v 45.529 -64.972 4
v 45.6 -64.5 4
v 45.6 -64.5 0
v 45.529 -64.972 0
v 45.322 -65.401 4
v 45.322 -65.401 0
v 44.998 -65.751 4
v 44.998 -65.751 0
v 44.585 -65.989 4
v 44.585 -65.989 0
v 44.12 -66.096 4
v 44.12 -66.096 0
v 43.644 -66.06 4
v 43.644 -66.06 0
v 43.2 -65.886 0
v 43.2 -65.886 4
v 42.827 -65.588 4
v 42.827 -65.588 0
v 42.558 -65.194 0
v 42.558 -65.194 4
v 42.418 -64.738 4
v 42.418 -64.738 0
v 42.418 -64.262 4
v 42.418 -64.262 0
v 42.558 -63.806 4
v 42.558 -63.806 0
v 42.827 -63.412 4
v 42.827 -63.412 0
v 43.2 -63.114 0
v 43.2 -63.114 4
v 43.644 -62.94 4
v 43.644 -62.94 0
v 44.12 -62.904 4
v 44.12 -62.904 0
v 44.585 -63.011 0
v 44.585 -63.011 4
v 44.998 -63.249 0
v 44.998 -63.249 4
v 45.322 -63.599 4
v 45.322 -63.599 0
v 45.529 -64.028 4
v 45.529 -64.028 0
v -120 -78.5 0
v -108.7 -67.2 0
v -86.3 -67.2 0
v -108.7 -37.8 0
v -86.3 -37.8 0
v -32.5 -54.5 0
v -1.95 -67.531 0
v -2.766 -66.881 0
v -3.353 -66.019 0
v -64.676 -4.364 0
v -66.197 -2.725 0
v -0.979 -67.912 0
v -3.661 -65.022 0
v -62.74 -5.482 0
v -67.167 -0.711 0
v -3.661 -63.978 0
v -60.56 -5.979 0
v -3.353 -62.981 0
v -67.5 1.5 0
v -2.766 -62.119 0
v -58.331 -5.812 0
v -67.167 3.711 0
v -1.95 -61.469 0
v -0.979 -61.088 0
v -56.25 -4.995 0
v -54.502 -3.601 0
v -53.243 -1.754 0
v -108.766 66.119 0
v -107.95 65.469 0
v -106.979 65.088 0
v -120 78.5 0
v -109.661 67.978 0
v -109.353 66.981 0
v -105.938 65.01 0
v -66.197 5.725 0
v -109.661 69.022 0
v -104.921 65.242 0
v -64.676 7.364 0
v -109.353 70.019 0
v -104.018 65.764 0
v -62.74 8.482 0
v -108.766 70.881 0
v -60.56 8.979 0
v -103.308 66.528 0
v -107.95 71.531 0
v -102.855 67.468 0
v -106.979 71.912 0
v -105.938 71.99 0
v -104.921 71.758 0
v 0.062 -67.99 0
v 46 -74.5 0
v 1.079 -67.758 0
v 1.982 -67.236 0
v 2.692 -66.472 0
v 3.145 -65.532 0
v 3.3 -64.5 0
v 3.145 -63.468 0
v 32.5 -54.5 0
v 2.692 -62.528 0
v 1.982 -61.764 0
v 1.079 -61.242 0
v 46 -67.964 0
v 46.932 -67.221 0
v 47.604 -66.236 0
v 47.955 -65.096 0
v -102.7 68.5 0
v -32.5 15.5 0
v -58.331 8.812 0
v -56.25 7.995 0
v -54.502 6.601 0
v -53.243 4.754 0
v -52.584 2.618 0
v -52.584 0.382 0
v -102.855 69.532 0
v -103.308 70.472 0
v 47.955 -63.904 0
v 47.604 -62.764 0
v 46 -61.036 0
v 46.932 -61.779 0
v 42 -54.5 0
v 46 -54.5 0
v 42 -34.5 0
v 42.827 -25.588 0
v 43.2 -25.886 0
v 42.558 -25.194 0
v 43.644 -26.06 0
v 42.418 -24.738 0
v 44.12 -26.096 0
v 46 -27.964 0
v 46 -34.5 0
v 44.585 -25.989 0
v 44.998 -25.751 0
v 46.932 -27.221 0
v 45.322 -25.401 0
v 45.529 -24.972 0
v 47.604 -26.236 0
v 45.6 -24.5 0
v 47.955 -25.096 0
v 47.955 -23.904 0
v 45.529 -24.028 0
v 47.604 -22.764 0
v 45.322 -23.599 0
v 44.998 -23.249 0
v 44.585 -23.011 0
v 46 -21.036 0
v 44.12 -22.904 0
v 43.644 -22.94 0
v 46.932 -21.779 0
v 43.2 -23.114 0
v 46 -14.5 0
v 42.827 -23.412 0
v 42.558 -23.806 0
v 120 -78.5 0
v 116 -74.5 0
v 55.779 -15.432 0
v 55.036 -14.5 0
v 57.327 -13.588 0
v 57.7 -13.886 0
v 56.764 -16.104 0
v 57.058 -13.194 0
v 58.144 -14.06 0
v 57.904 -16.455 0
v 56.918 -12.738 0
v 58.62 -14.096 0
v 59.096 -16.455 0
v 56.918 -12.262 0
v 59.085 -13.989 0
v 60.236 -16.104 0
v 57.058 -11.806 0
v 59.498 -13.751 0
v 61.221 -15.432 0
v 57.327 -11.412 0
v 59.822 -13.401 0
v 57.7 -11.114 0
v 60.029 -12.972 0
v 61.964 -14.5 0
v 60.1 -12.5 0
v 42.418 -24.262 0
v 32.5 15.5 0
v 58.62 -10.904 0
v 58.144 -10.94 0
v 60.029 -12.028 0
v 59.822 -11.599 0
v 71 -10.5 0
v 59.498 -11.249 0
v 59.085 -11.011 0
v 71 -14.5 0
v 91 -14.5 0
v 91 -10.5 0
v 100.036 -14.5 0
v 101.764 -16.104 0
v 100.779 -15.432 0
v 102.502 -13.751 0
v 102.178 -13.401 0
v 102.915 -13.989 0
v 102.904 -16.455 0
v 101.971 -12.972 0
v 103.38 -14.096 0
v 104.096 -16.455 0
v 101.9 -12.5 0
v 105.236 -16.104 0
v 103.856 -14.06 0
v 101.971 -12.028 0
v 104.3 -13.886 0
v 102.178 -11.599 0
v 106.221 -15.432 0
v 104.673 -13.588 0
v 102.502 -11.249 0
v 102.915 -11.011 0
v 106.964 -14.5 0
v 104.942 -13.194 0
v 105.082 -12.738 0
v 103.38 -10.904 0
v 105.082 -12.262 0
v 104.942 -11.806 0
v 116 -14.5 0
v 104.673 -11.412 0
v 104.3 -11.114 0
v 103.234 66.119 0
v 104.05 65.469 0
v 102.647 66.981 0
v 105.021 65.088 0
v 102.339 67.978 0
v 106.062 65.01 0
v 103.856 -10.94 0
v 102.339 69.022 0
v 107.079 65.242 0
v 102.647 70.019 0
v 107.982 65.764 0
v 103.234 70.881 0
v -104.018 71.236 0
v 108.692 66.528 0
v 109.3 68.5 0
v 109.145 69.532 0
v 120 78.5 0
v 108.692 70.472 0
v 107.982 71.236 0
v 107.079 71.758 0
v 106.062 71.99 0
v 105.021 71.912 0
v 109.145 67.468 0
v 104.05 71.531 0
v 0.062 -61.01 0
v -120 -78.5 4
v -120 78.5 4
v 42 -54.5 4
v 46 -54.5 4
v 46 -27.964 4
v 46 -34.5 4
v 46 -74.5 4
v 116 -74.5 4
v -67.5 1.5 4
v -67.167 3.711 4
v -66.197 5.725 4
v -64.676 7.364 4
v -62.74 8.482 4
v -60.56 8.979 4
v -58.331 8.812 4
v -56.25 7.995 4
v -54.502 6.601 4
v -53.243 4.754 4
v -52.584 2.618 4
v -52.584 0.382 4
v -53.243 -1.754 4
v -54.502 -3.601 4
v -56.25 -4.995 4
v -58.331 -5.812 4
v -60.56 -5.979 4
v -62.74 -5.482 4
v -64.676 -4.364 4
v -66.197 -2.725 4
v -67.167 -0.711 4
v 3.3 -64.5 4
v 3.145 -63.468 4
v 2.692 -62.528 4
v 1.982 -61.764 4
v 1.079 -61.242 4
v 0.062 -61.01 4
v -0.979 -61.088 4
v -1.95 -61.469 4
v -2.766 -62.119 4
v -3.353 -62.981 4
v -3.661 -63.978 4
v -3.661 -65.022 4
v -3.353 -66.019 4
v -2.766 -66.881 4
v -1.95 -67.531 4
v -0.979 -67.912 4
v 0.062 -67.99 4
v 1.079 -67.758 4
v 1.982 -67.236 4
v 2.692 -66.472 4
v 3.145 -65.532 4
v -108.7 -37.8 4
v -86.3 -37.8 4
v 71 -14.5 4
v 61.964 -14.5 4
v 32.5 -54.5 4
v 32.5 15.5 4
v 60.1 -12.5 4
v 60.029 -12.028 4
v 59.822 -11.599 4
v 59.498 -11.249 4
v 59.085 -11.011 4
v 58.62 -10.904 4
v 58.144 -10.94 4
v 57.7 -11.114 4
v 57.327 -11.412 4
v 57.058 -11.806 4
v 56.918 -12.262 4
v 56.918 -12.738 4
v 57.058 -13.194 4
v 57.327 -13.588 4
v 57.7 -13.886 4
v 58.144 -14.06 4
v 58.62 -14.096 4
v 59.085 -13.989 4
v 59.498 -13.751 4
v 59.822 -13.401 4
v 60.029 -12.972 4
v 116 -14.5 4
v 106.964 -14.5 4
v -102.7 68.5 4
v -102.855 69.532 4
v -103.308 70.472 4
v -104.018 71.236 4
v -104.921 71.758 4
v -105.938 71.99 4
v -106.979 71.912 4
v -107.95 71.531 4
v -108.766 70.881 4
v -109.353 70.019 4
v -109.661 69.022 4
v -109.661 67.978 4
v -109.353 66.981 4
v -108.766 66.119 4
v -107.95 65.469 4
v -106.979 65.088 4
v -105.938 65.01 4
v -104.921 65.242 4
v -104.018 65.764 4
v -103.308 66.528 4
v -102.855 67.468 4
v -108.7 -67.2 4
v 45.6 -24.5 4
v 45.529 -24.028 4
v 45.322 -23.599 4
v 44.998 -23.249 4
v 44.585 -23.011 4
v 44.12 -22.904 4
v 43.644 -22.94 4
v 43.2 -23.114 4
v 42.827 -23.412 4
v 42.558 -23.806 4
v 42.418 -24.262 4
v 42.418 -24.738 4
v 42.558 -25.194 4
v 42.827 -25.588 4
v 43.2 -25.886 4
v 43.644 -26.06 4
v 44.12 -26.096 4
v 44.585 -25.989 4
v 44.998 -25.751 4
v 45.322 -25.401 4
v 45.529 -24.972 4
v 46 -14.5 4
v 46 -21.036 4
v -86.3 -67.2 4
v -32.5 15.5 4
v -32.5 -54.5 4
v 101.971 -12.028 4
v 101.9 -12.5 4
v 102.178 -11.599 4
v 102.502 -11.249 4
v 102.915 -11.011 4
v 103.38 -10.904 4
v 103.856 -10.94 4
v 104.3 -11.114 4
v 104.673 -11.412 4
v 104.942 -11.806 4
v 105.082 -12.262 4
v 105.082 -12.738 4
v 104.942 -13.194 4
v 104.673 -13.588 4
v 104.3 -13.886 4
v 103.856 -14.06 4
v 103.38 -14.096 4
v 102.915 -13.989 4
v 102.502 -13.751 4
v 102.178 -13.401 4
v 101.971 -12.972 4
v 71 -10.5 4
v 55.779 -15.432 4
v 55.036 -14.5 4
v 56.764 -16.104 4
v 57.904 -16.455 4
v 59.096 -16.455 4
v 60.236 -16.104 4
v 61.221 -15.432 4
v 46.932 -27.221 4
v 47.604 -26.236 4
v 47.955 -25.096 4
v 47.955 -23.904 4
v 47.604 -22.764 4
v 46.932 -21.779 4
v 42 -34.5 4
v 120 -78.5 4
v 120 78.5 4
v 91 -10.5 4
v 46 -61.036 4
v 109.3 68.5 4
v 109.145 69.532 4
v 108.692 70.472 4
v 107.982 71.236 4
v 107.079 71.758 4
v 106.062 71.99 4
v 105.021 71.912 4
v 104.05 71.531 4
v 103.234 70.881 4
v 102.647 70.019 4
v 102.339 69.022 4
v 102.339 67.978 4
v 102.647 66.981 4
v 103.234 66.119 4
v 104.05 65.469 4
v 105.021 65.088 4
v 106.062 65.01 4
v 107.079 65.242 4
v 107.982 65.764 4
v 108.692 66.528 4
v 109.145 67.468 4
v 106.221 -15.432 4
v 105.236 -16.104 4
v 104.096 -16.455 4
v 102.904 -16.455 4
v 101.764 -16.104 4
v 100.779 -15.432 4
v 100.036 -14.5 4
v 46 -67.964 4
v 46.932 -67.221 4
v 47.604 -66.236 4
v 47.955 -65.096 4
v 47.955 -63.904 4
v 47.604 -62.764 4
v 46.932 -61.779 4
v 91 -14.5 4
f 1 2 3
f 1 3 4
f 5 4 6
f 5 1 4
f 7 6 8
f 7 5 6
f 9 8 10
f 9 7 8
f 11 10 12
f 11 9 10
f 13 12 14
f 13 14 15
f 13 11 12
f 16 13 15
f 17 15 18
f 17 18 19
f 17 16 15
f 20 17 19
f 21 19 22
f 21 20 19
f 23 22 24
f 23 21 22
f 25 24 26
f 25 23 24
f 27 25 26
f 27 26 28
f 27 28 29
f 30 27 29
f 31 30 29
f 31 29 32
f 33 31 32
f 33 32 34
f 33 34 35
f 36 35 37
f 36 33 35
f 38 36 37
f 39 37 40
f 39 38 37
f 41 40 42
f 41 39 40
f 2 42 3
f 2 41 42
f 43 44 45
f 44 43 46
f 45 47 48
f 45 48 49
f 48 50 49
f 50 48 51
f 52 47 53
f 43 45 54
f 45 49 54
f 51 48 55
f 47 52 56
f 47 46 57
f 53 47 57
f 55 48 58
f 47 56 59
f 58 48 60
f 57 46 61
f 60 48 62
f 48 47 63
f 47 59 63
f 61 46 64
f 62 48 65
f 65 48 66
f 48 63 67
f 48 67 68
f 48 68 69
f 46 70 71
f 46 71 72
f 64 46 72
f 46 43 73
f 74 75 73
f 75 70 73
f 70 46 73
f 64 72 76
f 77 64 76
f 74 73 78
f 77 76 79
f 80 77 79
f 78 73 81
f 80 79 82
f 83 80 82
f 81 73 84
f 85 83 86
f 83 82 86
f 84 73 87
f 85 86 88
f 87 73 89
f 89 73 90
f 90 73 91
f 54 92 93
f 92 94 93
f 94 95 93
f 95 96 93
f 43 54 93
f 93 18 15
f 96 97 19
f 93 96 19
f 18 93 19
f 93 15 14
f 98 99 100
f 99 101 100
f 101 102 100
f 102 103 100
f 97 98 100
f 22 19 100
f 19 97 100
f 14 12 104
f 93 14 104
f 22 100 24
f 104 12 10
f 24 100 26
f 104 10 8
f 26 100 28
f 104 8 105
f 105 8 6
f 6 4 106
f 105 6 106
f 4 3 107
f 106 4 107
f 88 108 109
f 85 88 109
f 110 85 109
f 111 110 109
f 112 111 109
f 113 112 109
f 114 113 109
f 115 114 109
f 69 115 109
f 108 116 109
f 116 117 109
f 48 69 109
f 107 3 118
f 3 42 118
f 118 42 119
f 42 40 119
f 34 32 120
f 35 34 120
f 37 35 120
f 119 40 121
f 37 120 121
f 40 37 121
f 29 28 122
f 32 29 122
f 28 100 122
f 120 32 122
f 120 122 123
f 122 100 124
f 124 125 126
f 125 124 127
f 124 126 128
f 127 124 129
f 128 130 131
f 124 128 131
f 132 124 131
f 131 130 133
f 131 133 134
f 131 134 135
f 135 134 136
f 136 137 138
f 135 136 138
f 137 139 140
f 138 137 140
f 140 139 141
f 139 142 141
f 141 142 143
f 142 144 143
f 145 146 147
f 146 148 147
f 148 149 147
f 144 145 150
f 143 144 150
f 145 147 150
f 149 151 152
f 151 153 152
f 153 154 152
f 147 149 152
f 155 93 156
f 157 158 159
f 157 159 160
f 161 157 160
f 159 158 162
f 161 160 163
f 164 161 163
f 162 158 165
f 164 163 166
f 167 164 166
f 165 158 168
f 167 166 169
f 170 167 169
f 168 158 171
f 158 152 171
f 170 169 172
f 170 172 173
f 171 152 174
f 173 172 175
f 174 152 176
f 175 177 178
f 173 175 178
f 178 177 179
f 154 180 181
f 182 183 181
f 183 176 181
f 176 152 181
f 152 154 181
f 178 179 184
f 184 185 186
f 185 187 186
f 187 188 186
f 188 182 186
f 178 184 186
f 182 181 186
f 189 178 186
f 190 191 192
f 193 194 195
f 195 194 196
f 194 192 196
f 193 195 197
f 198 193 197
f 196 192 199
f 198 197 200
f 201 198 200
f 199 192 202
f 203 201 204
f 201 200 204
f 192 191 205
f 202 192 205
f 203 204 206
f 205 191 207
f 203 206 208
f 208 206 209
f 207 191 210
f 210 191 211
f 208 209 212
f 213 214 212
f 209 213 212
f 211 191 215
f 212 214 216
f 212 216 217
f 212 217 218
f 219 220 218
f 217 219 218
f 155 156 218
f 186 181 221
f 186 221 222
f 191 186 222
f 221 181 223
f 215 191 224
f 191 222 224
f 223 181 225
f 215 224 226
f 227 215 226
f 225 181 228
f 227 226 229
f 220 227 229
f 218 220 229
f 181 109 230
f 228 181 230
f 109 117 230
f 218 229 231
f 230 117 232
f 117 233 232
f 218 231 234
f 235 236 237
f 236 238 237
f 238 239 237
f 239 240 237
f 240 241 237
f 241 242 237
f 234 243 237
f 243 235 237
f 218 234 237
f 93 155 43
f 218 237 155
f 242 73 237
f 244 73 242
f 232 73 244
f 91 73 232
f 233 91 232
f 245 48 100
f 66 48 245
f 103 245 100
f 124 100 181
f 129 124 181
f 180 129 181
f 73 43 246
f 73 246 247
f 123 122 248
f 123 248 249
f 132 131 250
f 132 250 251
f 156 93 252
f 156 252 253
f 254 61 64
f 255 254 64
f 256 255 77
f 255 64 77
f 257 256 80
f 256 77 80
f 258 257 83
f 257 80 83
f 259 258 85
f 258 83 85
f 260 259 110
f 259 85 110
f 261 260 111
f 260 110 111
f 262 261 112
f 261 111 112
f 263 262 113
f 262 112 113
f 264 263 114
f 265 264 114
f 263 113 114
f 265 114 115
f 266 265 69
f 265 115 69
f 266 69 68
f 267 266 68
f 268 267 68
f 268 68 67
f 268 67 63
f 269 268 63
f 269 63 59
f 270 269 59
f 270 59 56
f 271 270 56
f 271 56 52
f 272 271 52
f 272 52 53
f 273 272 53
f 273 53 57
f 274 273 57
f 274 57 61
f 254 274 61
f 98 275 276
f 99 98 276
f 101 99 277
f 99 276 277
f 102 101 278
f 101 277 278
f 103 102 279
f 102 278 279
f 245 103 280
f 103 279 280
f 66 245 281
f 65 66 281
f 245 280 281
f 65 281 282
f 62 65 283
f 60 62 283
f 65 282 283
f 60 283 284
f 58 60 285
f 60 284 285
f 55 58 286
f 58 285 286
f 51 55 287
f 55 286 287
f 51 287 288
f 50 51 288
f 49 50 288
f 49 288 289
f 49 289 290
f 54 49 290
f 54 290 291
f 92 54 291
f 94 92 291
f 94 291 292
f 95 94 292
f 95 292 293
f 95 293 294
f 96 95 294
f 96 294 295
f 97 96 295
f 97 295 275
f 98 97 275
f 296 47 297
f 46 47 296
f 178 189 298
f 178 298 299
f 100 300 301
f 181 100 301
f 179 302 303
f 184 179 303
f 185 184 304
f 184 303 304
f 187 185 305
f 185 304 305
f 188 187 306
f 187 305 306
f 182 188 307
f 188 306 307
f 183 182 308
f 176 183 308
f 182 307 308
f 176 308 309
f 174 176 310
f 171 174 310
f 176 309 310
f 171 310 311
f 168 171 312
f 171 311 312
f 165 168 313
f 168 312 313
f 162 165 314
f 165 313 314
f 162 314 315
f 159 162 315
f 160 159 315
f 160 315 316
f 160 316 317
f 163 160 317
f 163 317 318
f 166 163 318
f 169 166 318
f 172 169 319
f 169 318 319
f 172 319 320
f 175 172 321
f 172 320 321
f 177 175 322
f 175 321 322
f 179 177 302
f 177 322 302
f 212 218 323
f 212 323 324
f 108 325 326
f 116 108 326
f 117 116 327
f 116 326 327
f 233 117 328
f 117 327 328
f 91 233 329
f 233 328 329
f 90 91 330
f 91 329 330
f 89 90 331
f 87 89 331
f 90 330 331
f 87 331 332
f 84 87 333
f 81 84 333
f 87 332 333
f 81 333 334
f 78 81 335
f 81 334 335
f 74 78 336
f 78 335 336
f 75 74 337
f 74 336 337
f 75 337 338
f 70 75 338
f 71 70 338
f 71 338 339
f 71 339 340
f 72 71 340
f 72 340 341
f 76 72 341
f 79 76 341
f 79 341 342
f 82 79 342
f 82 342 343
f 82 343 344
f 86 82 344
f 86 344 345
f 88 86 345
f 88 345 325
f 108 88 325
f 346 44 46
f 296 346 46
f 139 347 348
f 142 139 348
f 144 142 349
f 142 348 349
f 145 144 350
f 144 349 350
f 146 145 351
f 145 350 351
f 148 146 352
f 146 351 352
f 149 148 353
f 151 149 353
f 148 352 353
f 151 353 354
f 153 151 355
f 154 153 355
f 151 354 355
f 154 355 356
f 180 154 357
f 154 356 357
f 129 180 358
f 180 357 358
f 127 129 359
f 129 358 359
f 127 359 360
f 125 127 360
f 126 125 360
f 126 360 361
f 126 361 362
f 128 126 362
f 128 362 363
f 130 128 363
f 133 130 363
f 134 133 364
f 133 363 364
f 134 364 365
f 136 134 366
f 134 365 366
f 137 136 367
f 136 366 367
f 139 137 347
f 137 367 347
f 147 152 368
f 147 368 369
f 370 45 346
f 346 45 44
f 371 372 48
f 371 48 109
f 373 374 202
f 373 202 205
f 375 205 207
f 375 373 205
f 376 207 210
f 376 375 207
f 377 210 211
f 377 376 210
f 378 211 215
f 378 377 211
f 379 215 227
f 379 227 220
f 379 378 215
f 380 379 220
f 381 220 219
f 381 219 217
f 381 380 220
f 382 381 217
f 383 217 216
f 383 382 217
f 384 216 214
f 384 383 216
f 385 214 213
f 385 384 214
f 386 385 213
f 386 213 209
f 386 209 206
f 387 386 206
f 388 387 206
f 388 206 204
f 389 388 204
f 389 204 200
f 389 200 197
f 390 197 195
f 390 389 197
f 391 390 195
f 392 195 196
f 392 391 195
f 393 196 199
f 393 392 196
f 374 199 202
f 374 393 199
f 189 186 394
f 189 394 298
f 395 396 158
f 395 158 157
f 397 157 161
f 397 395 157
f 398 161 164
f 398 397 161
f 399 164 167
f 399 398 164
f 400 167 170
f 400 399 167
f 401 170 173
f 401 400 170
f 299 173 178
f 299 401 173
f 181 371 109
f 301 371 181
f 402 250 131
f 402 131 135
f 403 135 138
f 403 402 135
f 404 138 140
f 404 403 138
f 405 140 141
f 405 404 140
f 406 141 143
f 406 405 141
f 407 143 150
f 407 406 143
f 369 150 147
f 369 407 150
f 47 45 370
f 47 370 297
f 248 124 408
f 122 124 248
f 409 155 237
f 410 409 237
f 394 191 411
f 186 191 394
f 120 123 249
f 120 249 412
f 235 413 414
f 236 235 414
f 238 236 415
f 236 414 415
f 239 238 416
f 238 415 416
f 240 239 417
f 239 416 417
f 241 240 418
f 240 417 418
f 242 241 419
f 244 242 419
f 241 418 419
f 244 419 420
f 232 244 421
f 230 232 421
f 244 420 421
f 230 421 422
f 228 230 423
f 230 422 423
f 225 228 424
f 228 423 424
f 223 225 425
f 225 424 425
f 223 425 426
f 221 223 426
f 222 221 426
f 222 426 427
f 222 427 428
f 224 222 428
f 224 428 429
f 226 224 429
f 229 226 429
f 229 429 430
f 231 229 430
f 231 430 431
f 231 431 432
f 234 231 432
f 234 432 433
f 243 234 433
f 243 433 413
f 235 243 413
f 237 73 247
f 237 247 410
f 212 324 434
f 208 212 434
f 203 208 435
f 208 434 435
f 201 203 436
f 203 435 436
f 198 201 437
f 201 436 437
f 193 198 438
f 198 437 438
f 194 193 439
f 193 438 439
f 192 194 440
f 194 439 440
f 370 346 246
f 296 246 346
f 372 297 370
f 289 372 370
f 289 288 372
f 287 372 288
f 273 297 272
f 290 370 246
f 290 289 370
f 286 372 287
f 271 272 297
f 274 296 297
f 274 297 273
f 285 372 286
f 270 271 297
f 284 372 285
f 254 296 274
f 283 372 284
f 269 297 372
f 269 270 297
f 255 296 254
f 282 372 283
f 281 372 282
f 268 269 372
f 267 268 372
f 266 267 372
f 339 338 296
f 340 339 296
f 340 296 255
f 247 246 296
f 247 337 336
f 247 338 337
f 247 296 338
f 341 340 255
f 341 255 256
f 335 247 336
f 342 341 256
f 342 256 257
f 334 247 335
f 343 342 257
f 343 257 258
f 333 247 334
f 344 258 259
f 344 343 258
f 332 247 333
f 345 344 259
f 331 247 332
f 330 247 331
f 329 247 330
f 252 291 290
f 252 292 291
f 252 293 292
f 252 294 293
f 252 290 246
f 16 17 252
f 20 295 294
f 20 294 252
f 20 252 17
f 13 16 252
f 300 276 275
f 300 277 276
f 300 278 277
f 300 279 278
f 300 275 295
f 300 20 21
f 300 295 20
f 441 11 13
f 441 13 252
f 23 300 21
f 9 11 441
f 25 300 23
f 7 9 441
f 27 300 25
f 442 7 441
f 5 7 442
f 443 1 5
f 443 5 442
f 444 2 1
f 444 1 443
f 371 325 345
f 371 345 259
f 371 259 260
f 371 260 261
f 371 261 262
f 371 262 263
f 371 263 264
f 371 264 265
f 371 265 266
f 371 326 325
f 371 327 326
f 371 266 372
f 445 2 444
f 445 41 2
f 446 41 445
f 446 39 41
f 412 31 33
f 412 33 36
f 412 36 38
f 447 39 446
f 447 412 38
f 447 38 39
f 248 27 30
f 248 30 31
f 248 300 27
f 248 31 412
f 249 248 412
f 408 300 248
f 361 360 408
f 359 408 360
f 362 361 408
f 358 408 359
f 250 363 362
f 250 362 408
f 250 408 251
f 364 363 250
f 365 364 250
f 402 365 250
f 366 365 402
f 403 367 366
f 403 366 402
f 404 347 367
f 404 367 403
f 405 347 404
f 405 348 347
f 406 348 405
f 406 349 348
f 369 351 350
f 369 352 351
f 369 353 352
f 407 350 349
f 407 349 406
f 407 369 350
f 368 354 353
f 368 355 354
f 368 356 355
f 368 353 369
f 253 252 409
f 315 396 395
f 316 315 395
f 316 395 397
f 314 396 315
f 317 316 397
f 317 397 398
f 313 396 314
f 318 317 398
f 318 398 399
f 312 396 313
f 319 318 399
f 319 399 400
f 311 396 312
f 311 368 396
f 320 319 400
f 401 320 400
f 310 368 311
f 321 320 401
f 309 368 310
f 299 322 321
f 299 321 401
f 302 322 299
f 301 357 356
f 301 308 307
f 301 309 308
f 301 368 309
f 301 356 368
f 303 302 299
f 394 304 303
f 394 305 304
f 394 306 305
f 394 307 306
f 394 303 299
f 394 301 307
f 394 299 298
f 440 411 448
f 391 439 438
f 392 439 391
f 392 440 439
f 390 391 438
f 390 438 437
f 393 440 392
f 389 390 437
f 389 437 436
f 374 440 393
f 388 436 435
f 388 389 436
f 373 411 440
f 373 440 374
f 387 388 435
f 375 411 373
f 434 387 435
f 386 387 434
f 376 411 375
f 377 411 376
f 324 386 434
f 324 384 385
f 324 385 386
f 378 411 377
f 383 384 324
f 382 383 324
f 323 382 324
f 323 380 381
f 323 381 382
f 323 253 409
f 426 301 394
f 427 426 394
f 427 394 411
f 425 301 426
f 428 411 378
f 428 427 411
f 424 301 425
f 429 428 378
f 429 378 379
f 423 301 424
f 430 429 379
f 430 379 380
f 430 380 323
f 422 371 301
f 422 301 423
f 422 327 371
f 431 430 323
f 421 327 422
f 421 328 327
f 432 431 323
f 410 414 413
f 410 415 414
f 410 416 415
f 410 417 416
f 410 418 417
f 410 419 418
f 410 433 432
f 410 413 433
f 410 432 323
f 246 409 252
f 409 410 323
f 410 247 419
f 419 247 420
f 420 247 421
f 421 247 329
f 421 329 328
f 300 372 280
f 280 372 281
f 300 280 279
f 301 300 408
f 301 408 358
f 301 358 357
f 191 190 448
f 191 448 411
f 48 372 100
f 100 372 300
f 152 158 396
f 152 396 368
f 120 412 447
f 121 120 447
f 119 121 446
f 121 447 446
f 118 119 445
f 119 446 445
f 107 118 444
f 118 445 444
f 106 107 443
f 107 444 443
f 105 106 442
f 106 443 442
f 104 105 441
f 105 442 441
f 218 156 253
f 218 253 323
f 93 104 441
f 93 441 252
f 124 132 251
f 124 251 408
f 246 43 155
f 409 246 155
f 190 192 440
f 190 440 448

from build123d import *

# Parameters (mm, degrees)
SKETCH1_W           = 240
SKETCH1_H           = 157
BOSS_EXTRUDE1_DEPTH = 4
SKETCH2_R           = 3.5
CUT_EXTRUDE1_DEPTH  = 144.451211218
CUT_EXTRUDE2_DEPTH  = 4
SKETCH4_R           = 1.6
BOSS_EXTRUDE2_DEPTH = 4
SKETCH4_2_R         = 1.6
CUT_EXTRUDE3_DEPTH  = 4
SKETCH5_R           = 1.6
CUT_EXTRUDE5_DEPTH  = 4
BOSS_EXTRUDE4_DEPTH = 4
SKETCH6_R           = 7.5
CUT_EXTRUDE6_DEPTH  = 144.451211218
SKETCH7_W           = 65
SKETCH7_H           = 70
CUT_EXTRUDE7_DEPTH  = 144.451211218
SKETCH8_W           = 22.4
SKETCH8_H           = 29.4
CUT_EXTRUDE8_DEPTH  = 144.451211218


with BuildPart() as part:
    # Sketch1 → Boss-Extrude1 (new body)
    with BuildSketch(Plane.XY):
        Rectangle(SKETCH1_W, SKETCH1_H)
    extrude(amount=BOSS_EXTRUDE1_DEPTH)

    # Sketch2 → Cut-Extrude1 (cut, through all)
    with BuildSketch(Plane.XY.offset(4)):
        with Locations((-106.199999998, 68.5)):
            Circle(SKETCH2_R)
        with Locations((105.8, 68.5)):
            Circle(SKETCH2_R)
        with Locations((-0.199999998, -64.5)):
            Circle(SKETCH2_R)
    extrude(amount=-CUT_EXTRUDE1_DEPTH, mode=Mode.SUBTRACT)

    # Sketch3 → Cut-Extrude2 (cut)
    with BuildSketch(Plane(origin=(0, 0, 0), x_dir=(-1, 0, 0), z_dir=(0, 0, -1))):
        Polygon((-46, -74.5), (-116, -74.5), (-116, -14.5), (-91, -14.5), (-91, -10.5), (-71, -10.5), (-71, -14.5), (-46, -14.5), (-46, -34.5), (-42, -34.5), (-42, -54.5), (-46, -54.5), align=None)
    extrude(amount=-CUT_EXTRUDE2_DEPTH, mode=Mode.SUBTRACT)

    # Sketch4 → Boss-Extrude2 (add)
    with BuildSketch(Plane.XY.offset(4)):
        with Locations((44, -24.5)):
            Circle(SKETCH4_R)
        with BuildLine():
            Line((46, -21.035898385), (46, -27.964101615))
            ThreePointArc((46, -27.964101615), (48, -24.5), (46, -21.035898385))
        make_face()
    boss_extrude2 = extrude(amount=-BOSS_EXTRUDE2_DEPTH)

    # Sketch4<2> → Cut-Extrude3 (cut)
    with BuildSketch(Plane.XY.offset(4)):
        with Locations((44, -24.5)):
            Circle(SKETCH4_2_R)
    cut_extrude3 = extrude(amount=-CUT_EXTRUDE3_DEPTH, mode=Mode.SUBTRACT)

    # Mirror1: Boss-Extrude2, Cut-Extrude3 across plane
    add(boss_extrude2.mirror(Plane(origin=(0, -44.5, 0), x_dir=(0, 0, 1), z_dir=(0, -1, 0))))
    add(cut_extrude3.mirror(Plane(origin=(0, -44.5, 0), x_dir=(0, 0, 1), z_dir=(0, -1, 0))), mode=Mode.SUBTRACT)

    # Sketch5 → Cut-Extrude5 (cut)
    with BuildSketch(Plane.XY.offset(4)):
        with Locations((58.5, -12.5)):
            Circle(SKETCH5_R)
    cut_extrude5 = extrude(amount=-CUT_EXTRUDE5_DEPTH, mode=Mode.SUBTRACT)

    # Sketch5<5> → Boss-Extrude4 (add)
    with BuildSketch(Plane.XY.offset(4)):
        with BuildLine():
            Line((61.964101615, -14.5), (55.035898385, -14.5))
            ThreePointArc((55.035898385, -14.5), (58.5, -16.5), (61.964101615, -14.5))
        make_face()
    boss_extrude4 = extrude(amount=-BOSS_EXTRUDE4_DEPTH)

    # Mirror3: Cut-Extrude5, Boss-Extrude4 across plane
    add(cut_extrude5.mirror(Plane(origin=(81, 0, 0), x_dir=(0, 0, 1), z_dir=(1, 0, 0))), mode=Mode.SUBTRACT)
    add(boss_extrude4.mirror(Plane(origin=(81, 0, 0), x_dir=(0, 0, 1), z_dir=(1, 0, 0))))

    # Sketch6 → Cut-Extrude6 (cut, through all)
    with BuildSketch(Plane(origin=(0, 0, 0), x_dir=(-1, 0, 0), z_dir=(0, 0, -1))):
        with Locations((60, 1.5)):
            Circle(SKETCH6_R)
    extrude(amount=-CUT_EXTRUDE6_DEPTH, mode=Mode.SUBTRACT)

    # Sketch7 → Cut-Extrude7 (cut, through all)
    with BuildSketch(Plane.XY.offset(4)):
        with Locations((0, -19.5)):
            Rectangle(SKETCH7_W, SKETCH7_H)
    extrude(amount=-CUT_EXTRUDE7_DEPTH, mode=Mode.SUBTRACT)

    # Sketch8 → Cut-Extrude8 (cut, through all)
    with BuildSketch(Plane(origin=(0, 0, 0), x_dir=(-1, 0, 0), z_dir=(0, 0, -1))):
        with Locations((97.5, -52.5)):
            Rectangle(SKETCH8_W, SKETCH8_H)
    extrude(amount=-CUT_EXTRUDE8_DEPTH, mode=Mode.SUBTRACT)


solid = part.part
